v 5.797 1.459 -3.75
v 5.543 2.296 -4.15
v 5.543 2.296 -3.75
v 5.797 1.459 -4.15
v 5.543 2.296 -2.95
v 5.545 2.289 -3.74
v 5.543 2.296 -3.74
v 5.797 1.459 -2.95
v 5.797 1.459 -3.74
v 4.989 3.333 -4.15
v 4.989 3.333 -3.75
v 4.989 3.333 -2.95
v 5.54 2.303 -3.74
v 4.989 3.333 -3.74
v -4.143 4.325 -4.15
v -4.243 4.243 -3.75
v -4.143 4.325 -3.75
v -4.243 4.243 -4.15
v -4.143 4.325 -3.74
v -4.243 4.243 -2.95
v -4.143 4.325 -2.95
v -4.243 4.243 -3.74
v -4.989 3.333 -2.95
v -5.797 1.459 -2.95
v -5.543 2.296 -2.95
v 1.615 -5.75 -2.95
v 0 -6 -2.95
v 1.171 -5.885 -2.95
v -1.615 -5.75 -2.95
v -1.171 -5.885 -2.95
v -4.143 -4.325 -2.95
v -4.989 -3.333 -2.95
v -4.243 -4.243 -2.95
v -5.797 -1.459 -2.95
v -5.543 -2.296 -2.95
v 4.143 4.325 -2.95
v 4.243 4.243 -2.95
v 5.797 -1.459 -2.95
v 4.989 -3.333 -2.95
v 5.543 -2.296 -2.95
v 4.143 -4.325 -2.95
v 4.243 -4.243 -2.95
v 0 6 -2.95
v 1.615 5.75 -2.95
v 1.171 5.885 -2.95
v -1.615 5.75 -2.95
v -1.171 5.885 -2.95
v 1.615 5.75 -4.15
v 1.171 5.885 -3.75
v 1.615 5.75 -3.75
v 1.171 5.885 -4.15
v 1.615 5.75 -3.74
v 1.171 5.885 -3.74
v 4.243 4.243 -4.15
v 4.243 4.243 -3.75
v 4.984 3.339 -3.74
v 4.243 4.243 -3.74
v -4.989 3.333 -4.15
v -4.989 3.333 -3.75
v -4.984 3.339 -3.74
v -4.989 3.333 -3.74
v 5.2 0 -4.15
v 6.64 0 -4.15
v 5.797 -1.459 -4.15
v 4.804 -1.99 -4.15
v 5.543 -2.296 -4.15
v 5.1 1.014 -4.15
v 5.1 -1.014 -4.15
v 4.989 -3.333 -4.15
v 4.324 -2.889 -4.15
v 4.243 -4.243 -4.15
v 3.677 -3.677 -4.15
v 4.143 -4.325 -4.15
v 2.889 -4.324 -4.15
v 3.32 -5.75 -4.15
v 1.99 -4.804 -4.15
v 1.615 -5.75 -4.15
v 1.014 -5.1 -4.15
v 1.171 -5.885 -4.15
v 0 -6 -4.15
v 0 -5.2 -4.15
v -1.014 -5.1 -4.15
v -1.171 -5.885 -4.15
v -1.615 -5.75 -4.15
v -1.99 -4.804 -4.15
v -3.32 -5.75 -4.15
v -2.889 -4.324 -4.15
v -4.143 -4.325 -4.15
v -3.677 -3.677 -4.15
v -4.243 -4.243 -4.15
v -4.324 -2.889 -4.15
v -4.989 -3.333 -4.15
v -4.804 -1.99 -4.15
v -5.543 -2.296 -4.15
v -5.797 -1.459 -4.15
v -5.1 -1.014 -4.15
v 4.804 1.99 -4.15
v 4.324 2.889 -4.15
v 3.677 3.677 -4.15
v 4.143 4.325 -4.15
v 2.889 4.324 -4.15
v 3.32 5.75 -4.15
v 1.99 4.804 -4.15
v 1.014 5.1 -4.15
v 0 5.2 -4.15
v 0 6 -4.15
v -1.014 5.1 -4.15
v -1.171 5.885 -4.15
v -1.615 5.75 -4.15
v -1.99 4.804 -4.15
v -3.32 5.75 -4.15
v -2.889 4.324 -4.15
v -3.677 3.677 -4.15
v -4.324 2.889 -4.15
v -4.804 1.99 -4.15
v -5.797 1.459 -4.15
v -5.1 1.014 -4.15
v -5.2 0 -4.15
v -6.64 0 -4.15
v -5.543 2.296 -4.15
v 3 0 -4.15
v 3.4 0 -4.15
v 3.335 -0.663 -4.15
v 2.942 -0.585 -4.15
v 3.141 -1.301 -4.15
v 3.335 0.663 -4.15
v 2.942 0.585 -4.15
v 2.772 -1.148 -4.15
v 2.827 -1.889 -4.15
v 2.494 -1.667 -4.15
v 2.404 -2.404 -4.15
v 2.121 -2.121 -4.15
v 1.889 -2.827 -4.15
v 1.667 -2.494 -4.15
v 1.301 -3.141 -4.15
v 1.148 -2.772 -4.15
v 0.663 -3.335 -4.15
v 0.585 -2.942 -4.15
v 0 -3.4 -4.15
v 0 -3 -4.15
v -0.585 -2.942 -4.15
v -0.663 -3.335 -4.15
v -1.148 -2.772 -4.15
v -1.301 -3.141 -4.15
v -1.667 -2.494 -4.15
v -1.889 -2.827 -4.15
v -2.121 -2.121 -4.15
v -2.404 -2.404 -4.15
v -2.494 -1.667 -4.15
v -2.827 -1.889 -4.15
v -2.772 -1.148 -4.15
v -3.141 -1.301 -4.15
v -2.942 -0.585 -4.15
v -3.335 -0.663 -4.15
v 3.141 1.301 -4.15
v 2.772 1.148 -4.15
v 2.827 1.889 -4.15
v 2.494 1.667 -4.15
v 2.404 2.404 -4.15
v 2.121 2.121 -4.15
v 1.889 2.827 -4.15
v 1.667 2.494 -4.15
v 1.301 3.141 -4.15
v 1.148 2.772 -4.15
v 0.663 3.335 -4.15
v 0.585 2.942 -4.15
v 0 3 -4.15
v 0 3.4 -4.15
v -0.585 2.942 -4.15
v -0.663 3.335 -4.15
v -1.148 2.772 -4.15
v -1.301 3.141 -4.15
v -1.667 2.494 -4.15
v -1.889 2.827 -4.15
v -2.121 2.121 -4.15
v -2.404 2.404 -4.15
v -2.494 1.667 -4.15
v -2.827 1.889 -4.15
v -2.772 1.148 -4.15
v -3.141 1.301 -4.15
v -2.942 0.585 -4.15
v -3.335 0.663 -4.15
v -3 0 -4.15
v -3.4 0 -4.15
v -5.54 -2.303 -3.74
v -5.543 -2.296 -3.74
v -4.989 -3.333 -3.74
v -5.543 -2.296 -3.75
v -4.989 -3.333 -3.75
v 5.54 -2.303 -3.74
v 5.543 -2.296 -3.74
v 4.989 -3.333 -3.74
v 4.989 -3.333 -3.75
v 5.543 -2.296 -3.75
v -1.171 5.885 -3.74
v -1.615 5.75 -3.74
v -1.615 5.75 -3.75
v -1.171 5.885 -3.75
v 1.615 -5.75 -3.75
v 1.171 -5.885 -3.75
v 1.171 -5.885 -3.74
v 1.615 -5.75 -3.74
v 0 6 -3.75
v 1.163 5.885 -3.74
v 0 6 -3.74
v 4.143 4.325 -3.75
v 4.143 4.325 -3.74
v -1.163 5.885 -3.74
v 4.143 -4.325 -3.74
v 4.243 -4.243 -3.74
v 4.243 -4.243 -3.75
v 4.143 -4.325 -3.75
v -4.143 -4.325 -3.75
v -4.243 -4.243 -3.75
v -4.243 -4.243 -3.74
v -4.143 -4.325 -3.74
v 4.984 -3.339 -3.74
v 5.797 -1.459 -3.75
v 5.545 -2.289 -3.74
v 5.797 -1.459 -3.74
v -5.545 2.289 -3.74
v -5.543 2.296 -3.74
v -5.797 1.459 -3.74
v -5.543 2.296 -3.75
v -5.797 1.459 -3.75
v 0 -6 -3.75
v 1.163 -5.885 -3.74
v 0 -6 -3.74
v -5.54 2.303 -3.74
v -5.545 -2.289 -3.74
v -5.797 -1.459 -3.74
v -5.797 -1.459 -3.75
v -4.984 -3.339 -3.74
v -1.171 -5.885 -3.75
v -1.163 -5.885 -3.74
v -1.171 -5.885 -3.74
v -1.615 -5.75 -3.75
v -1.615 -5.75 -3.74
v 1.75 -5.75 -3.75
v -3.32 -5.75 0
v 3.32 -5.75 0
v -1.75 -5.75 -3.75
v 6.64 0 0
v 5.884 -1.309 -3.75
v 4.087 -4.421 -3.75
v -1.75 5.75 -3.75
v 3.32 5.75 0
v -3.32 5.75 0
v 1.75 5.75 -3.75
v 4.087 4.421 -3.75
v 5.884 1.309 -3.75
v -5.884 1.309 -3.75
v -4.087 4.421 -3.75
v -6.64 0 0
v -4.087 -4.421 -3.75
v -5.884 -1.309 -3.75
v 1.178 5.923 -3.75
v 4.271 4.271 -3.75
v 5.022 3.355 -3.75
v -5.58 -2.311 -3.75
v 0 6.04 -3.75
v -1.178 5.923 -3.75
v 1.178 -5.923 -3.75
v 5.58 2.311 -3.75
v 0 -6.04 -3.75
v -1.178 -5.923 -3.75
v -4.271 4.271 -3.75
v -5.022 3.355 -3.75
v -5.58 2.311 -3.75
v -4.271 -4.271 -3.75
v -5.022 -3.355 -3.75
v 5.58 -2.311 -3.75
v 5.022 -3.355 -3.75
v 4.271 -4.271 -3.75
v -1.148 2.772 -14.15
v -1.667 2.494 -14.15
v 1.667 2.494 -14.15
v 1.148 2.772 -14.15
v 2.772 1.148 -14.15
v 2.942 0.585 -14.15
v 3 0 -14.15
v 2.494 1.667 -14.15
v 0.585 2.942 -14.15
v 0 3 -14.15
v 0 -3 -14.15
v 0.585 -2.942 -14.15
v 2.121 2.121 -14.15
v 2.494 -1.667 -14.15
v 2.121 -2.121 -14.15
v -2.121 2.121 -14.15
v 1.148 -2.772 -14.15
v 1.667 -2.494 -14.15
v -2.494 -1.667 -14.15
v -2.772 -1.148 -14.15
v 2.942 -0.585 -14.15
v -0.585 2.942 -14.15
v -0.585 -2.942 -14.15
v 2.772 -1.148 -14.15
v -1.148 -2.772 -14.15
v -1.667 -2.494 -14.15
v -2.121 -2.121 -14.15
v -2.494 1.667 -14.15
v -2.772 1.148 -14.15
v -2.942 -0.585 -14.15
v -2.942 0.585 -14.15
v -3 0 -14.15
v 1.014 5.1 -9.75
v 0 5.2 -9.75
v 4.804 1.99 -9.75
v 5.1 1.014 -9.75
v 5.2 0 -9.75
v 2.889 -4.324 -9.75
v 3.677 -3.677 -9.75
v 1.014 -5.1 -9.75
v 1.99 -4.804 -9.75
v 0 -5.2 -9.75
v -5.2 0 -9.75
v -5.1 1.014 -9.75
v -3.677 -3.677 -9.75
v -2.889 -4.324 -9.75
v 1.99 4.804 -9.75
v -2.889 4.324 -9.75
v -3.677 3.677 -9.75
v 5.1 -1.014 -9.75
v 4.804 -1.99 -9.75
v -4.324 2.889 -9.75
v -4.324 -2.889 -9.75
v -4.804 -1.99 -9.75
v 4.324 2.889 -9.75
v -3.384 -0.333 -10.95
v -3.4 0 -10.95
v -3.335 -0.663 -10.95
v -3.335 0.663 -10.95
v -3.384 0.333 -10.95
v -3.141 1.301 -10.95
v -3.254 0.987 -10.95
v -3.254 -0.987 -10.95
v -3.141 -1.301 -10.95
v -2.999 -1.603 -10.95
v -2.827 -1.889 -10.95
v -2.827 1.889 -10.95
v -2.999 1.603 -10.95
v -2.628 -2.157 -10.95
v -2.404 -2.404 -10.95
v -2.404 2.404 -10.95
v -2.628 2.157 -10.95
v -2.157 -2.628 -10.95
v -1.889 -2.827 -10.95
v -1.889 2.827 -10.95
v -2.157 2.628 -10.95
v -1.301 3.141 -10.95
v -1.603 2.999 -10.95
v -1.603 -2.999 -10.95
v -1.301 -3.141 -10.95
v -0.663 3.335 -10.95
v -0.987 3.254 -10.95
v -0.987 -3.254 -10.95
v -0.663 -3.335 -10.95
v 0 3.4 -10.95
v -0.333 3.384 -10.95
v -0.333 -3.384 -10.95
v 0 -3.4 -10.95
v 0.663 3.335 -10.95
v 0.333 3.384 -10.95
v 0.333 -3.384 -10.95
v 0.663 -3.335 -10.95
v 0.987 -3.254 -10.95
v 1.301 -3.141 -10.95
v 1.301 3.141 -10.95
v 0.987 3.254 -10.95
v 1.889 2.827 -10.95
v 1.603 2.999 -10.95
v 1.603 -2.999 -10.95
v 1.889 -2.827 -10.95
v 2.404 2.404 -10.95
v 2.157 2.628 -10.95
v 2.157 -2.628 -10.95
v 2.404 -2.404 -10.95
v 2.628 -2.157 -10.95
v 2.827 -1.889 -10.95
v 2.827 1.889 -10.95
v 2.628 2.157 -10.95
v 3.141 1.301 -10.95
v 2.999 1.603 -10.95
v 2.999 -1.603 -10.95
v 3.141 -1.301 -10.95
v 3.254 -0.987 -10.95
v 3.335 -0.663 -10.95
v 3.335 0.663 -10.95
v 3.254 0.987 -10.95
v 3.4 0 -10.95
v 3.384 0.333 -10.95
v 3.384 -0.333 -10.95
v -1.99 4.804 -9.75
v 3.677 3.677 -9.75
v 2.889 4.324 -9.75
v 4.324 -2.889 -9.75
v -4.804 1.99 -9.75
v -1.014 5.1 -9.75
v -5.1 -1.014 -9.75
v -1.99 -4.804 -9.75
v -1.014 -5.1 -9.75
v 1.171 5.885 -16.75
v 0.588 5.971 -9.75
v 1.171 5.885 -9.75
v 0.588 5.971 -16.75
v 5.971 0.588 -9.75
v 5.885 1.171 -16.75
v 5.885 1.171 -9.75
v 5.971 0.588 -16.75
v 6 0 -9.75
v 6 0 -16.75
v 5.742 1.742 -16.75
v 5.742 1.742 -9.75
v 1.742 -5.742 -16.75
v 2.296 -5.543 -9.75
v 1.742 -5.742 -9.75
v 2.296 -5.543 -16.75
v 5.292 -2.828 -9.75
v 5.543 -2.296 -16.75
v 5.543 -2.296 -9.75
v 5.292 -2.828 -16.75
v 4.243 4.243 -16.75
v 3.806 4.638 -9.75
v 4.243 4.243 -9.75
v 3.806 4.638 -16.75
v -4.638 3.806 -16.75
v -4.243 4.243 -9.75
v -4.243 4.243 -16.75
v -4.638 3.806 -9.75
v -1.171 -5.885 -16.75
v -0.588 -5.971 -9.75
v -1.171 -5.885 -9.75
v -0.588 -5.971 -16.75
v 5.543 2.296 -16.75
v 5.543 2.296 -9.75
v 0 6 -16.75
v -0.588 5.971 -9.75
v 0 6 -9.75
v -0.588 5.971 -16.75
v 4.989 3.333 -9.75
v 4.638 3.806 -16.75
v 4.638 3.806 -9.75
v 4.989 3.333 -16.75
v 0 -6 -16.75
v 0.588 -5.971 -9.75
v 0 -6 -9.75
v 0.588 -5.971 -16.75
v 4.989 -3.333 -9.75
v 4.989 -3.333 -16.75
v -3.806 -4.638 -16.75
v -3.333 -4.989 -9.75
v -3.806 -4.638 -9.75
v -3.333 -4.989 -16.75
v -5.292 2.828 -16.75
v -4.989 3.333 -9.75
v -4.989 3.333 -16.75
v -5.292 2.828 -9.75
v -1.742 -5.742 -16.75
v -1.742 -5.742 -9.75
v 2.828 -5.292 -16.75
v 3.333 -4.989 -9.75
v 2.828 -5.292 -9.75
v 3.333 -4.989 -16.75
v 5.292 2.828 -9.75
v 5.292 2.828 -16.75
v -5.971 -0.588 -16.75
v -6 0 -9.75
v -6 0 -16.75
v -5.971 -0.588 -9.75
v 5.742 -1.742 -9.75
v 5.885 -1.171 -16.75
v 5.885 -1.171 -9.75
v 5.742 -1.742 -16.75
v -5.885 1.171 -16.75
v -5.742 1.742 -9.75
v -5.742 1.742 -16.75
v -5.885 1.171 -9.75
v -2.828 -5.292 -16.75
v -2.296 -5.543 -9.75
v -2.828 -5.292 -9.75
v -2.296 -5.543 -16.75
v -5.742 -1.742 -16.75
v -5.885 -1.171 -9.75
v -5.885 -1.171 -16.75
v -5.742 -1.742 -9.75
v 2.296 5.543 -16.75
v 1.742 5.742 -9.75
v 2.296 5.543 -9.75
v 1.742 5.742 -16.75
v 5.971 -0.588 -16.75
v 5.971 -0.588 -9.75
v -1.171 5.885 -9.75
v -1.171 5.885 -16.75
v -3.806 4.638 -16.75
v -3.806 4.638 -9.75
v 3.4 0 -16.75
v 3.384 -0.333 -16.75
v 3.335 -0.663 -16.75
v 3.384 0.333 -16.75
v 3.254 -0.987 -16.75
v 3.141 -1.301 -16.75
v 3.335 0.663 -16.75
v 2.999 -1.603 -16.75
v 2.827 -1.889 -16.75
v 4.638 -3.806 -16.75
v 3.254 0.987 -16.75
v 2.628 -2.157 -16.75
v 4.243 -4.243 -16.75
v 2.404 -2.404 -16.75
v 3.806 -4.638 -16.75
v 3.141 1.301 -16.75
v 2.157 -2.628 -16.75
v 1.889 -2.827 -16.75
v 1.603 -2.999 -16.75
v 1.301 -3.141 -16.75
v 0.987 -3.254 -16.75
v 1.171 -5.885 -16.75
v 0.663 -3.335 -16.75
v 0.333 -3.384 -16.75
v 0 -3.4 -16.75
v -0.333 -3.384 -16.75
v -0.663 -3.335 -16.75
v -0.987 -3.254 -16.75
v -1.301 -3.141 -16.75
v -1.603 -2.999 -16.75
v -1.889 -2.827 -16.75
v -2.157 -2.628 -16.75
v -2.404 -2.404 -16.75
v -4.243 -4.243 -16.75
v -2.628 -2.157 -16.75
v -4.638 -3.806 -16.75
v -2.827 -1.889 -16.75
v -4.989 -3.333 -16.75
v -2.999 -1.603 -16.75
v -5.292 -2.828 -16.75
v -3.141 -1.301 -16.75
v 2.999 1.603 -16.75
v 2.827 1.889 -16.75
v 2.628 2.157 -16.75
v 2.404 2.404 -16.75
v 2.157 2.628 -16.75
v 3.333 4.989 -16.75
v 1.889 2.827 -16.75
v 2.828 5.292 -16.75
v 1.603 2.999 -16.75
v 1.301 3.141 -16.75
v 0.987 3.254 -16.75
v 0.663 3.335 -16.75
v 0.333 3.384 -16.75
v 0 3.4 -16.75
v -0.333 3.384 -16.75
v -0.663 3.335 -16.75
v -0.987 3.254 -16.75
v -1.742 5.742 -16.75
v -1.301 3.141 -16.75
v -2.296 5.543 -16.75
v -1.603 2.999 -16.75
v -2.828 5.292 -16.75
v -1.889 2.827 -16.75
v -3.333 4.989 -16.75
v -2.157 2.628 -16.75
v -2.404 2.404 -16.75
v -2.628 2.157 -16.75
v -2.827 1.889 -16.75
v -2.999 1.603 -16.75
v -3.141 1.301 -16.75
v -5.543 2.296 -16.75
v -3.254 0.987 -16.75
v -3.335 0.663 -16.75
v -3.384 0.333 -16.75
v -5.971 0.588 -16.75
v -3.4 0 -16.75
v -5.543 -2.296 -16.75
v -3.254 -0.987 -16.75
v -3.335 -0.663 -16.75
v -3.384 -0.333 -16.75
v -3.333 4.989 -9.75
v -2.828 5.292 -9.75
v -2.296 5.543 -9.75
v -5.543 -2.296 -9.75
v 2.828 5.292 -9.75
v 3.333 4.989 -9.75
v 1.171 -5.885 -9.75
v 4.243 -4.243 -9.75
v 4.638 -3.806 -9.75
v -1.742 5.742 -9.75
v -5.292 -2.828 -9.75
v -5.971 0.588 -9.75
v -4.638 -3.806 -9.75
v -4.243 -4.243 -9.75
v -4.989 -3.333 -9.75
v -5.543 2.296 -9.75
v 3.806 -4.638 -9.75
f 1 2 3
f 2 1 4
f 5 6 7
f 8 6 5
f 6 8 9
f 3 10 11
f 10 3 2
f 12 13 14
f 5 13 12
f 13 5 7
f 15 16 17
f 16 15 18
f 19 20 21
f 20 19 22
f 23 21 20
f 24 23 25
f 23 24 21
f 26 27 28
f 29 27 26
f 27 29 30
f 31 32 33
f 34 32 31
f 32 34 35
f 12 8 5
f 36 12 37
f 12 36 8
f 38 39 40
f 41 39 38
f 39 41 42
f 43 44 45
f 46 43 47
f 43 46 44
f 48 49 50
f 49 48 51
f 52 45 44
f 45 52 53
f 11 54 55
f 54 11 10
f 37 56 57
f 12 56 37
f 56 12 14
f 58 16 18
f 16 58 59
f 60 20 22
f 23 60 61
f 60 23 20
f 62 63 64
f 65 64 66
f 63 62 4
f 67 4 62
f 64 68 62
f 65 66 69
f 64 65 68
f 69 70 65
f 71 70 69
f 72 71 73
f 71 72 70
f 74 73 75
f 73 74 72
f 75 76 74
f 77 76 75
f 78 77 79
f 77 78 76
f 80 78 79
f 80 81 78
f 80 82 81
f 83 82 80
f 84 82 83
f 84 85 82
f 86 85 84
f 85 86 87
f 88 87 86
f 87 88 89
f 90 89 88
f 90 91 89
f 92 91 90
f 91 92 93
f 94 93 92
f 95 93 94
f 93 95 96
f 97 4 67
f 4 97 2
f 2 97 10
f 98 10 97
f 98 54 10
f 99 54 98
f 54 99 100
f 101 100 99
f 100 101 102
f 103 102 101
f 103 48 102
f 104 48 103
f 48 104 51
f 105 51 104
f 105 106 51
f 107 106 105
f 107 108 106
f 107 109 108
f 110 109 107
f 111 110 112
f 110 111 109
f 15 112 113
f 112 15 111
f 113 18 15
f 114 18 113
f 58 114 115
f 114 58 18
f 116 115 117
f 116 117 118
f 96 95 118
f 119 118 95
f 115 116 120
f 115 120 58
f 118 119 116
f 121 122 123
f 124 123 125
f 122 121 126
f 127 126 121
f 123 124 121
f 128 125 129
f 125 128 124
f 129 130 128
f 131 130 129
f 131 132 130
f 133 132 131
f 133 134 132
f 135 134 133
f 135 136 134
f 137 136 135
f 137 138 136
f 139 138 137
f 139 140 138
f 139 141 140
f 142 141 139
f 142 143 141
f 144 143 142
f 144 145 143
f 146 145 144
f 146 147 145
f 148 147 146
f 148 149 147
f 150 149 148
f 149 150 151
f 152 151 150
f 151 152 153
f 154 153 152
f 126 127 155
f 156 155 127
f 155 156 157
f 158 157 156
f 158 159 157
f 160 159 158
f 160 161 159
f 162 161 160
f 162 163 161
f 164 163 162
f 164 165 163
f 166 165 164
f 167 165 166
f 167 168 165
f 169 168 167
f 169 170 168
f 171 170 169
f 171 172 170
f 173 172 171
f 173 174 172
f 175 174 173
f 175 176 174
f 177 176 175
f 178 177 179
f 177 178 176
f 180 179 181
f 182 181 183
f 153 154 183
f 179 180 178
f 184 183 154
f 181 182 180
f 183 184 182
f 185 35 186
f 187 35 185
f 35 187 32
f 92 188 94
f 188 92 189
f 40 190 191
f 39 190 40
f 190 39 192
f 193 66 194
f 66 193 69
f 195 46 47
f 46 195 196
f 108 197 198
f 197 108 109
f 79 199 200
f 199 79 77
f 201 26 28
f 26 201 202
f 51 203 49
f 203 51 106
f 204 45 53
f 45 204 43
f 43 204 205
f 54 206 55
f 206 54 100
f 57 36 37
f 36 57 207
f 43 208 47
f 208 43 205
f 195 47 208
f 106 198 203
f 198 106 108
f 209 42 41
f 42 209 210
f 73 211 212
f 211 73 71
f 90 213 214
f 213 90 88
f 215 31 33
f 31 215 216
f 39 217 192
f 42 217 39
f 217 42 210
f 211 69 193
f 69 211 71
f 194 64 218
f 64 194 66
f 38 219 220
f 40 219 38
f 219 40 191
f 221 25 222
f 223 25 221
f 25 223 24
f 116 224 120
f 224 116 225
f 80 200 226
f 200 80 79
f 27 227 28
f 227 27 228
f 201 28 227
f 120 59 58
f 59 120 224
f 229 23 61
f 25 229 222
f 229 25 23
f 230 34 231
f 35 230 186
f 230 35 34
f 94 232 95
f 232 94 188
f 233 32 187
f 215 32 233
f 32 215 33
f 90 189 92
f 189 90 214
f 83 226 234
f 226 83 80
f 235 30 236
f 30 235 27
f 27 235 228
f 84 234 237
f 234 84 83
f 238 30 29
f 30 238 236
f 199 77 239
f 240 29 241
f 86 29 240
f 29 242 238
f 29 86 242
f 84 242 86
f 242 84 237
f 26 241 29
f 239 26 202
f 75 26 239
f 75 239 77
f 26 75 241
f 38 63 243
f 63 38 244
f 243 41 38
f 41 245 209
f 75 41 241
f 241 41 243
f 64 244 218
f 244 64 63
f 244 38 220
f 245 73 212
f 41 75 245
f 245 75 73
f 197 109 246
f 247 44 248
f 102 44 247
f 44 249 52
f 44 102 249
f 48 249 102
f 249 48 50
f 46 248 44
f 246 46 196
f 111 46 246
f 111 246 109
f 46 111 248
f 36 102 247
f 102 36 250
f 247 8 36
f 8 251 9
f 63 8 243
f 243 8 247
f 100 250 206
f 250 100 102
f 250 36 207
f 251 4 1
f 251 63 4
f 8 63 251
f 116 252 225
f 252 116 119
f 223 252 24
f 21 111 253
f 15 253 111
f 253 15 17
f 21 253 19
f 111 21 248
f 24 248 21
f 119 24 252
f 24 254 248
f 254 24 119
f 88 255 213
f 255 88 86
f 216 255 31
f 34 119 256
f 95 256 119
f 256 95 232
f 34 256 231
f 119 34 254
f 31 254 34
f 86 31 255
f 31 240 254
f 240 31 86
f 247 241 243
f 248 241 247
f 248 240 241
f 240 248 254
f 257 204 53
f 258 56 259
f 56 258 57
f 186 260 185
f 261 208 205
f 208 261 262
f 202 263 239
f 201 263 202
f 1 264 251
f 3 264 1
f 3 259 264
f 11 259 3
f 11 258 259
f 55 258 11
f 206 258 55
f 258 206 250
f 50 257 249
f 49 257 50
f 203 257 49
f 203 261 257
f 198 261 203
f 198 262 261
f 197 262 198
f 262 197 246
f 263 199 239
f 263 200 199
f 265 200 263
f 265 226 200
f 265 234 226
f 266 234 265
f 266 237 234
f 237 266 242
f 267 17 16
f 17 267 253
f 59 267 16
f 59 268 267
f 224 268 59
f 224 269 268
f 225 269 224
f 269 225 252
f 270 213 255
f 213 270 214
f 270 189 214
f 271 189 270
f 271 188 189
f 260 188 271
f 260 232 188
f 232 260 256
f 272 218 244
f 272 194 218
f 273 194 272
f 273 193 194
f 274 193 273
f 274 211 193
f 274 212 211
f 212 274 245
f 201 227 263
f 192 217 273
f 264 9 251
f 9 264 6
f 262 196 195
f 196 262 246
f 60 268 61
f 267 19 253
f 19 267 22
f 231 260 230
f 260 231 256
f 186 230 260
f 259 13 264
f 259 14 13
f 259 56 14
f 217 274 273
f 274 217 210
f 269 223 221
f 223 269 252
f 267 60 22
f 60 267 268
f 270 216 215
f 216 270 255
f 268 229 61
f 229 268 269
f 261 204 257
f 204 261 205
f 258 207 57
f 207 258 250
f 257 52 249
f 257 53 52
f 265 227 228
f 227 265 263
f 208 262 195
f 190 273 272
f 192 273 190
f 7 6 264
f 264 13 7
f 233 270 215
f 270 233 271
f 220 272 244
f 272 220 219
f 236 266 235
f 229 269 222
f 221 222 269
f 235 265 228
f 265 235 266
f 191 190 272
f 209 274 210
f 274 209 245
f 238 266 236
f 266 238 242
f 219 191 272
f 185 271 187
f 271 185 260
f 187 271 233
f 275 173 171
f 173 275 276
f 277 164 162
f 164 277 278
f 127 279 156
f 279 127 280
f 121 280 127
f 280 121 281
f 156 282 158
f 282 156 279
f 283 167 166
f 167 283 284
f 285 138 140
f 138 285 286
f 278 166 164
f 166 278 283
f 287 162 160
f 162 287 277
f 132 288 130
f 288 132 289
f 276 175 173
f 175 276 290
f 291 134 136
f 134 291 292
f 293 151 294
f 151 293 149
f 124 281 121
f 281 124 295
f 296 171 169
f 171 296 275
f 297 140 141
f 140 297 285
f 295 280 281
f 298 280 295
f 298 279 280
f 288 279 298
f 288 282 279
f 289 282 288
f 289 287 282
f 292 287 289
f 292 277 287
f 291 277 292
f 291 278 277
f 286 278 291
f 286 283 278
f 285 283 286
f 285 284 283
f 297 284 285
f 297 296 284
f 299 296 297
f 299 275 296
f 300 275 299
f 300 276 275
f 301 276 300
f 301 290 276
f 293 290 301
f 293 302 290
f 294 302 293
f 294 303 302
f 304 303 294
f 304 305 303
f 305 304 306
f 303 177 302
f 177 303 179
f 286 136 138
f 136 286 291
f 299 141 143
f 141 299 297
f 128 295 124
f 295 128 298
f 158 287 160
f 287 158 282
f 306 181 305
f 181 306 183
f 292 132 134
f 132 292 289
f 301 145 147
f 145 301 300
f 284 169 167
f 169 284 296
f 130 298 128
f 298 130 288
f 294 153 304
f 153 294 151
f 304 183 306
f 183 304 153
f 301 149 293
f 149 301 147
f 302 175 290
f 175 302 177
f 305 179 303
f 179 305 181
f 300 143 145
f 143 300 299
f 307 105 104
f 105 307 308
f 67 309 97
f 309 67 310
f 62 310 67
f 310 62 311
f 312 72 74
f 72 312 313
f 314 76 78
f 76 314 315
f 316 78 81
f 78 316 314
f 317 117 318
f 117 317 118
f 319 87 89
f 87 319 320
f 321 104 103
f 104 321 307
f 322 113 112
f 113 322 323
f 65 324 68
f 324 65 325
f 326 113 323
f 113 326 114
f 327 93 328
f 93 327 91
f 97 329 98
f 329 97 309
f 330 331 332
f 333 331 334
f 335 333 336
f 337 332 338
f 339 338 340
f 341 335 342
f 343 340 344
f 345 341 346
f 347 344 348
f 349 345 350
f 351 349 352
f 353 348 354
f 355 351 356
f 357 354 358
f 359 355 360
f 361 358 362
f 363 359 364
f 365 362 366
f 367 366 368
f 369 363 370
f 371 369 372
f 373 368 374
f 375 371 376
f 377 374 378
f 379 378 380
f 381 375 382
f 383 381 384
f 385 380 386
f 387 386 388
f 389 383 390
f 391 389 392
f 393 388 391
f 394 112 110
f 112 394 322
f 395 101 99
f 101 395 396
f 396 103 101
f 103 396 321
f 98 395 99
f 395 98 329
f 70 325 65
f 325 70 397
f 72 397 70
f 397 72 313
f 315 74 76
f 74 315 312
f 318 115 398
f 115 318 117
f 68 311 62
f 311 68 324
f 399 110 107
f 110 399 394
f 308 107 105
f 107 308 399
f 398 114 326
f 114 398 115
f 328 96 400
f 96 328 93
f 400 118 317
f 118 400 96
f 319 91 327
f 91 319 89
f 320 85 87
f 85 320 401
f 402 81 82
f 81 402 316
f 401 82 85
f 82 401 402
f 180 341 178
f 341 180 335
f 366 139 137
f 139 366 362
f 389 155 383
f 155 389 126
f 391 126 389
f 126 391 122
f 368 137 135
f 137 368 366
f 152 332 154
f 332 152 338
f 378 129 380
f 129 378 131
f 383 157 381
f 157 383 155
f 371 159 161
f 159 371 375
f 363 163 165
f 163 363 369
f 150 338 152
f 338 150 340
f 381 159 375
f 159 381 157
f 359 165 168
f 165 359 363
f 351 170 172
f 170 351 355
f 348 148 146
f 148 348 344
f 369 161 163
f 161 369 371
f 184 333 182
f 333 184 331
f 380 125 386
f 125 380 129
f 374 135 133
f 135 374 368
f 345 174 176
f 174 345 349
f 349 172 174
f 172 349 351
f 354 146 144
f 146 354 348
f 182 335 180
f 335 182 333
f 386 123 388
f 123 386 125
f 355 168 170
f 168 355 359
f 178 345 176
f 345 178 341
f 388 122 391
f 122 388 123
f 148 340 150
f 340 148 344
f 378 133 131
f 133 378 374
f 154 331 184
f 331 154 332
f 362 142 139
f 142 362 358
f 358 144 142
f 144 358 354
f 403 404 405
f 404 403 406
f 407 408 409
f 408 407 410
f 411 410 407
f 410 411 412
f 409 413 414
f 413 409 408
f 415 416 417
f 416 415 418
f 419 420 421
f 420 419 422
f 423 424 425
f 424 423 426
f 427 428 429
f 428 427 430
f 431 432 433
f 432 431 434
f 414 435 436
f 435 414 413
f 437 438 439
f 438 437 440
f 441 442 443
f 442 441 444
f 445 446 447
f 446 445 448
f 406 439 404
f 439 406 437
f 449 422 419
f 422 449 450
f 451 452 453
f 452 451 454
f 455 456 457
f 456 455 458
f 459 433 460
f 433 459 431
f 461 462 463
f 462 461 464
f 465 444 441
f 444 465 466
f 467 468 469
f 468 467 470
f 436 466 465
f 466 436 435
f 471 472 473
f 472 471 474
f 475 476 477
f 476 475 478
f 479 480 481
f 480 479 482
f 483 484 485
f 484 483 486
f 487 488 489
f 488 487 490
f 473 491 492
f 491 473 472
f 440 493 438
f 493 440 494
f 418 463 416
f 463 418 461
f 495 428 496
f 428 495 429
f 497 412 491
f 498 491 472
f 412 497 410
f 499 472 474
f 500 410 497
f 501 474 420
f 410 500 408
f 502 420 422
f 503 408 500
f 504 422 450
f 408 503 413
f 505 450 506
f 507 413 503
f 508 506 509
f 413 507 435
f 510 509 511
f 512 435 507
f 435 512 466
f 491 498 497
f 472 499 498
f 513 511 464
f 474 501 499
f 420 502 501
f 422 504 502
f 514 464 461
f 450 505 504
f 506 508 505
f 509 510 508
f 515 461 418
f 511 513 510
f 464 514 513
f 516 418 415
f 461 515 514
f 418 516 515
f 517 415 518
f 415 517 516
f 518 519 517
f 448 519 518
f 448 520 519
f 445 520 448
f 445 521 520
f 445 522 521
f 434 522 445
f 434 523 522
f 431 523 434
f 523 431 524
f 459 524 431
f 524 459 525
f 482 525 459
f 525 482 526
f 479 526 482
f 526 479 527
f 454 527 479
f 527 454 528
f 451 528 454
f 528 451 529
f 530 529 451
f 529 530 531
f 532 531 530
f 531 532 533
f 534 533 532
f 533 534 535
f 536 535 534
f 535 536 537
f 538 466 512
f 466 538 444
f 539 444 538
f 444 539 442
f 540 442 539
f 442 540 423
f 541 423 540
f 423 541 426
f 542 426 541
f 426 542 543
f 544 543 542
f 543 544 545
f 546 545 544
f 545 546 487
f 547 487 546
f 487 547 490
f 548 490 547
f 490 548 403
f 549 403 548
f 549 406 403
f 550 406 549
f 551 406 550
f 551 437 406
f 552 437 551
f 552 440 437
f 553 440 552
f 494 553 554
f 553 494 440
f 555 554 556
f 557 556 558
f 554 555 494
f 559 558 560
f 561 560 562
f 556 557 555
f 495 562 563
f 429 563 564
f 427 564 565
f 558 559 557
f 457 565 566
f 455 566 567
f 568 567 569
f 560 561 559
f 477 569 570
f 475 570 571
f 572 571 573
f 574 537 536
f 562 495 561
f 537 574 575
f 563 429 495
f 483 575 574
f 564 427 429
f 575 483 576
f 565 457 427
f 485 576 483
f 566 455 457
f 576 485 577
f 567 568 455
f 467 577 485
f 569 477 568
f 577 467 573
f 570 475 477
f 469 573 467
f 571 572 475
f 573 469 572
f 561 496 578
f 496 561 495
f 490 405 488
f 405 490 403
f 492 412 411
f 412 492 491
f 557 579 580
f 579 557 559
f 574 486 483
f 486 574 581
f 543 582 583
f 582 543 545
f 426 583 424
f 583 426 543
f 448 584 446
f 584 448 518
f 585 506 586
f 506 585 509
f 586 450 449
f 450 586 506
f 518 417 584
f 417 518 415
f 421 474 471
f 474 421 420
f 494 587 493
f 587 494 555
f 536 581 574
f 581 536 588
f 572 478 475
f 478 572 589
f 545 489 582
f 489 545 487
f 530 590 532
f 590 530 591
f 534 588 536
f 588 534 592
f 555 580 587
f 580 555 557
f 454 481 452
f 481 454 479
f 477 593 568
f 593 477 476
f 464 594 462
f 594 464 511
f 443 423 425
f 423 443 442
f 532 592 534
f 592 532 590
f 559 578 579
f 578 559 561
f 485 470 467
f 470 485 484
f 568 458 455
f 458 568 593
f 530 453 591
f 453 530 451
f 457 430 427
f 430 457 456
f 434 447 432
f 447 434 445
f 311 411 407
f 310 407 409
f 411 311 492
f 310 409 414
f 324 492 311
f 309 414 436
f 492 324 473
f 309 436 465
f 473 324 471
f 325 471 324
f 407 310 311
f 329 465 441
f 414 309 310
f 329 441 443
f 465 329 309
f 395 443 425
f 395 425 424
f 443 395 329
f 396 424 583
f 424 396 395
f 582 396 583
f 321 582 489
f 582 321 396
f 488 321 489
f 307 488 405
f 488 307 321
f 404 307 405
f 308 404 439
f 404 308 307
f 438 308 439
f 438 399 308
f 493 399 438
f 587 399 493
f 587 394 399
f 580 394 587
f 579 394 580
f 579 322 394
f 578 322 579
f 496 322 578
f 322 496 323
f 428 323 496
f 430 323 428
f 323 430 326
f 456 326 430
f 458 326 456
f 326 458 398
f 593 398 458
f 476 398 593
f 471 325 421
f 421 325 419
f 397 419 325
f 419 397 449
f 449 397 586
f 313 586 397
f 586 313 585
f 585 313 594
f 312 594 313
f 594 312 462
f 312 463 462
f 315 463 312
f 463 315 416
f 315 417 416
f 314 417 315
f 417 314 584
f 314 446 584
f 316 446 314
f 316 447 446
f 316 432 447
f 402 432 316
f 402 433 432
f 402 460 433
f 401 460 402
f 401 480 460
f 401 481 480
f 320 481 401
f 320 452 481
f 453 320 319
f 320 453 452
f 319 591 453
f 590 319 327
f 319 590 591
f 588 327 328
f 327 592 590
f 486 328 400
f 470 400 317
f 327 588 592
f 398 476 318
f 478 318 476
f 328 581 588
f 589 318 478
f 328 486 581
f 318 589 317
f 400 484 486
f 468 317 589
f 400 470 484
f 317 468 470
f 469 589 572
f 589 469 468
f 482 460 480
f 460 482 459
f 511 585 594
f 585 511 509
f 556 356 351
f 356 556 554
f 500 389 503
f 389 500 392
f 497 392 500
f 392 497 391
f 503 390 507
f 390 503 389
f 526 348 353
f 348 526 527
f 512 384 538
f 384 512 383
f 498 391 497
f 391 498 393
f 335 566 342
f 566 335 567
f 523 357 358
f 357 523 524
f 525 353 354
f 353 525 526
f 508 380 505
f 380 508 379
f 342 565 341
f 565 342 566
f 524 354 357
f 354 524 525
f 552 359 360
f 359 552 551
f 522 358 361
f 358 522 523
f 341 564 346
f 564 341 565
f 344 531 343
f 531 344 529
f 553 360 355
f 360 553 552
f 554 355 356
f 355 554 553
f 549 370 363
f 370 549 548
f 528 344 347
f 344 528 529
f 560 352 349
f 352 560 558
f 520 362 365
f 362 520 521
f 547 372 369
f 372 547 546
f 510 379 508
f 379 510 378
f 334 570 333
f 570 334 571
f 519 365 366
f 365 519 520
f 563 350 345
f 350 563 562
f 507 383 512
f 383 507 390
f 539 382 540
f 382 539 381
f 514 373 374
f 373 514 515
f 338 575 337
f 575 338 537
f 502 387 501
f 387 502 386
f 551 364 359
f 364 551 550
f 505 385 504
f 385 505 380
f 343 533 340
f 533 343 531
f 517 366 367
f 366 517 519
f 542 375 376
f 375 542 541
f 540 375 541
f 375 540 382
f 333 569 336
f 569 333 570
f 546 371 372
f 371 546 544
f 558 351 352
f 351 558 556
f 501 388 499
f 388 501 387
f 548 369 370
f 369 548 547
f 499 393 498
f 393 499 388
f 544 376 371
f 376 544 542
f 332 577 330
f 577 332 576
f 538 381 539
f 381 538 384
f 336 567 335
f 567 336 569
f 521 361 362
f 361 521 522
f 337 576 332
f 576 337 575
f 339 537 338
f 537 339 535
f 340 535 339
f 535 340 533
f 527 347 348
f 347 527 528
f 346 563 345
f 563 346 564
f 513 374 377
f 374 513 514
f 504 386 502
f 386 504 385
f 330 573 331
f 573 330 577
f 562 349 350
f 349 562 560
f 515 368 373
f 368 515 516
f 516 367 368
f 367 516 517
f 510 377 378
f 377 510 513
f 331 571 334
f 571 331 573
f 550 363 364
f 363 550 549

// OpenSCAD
// Parameters
shaft_diameter_mm = 6; //[3:12:0.1]
length_under_head_mm = 10; //[5:20:0.1]
head_across_flats_mm = 11.5; //[8:23:0.1]
head_height_mm = 4.15; //[2:8.3:0.05]
thread_pitch_mm = 1; //[0.5:2:0.05]
thread_length_mm = 10; //[5:20:0.1]
under_head_chamfer_height_mm = 0.8; //[0.3:1.6:0.05]
under_head_chamfer_radial_mm = 0.6; //[0.2:1.2:0.05]
tip_chamfer_height_mm = 0.6; //[0.2:1.2:0.05]
tip_chamfer_radial_mm = 0.4; //[0.1:0.8:0.05]
washer_outer_diameter_mm = 12; //[8:24:0.1]
washer_thickness_mm = 1.2; //[0.6:2.4:0.05]
washer_hole_diameter_mm = 6.6; //[6.2:8:0.05]
pcb_spacer_height_mm = 8; //[4:16:0.1]
pcb_spacer_wall_mm = 1.8; //[0.9:3.6:0.05]
pcb_spacer_inner_diameter_mm = 6.8; //[6.2:9:0.05]
buzzer_diameter_mm = 12; //[8:24:0.1]
buzzer_height_mm = 7; //[4:14:0.1]
buzzer_center_hole_diameter_mm = 6.8; //[6.2:9:0.05]
overlap_mm = 1.2; //[0.5:2:0.1]  // 1-2mm overlap for guaranteed connectivity

// --- Z stack ---
// Reference: top of head at z = 0, everything extends downward (negative z)
z_head_top    = 0;
z_head_bottom = z_head_top - head_height_mm;

// Under-head chamfer overlaps into head and shaft
z_chamfer_top    = z_head_bottom + overlap_mm;
z_chamfer_bottom = z_chamfer_top - under_head_chamfer_height_mm;

// Shaft starts slightly inside chamfer and runs down to end of screw
z_shaft_top    = z_chamfer_bottom + overlap_mm;
z_shaft_bottom = z_head_bottom - length_under_head_mm;

// Tip chamfer at end of shaft, overlapping into shaft
z_tip_top    = z_shaft_bottom + overlap_mm;
z_tip_bottom = z_tip_top - tip_chamfer_height_mm;

// Washer sits under head, overlapping into head/shaft
z_washer_top    = z_head_bottom + overlap_mm;
z_washer_bottom = z_washer_top - washer_thickness_mm;

// Spacer sits under washer, overlapping
z_spacer_top    = z_washer_bottom + overlap_mm;
z_spacer_bottom = z_spacer_top - pcb_spacer_height_mm;

// Buzzer sits under spacer, overlapping (ensures black cylinder is attached)
z_buzzer_top    = z_spacer_bottom + overlap_mm;
z_buzzer_bottom = z_buzzer_top - buzzer_height_mm;

// --- Modules ---
module screw_and_washer() {
  color("DimGray")
  union() {
    // Hex Head
    translate([0, 0, (z_head_top + z_head_bottom)/2])
      cylinder(h=head_height_mm, r=(head_across_flats_mm/2)/cos(30), $fn=6, center=true);

    // Under-head Chamfer (overlaps into head and shaft)
    translate([0, 0, (z_chamfer_top + z_chamfer_bottom)/2])
      cylinder(
        h=under_head_chamfer_height_mm,
        r1=(head_across_flats_mm/2)/cos(30) - under_head_chamfer_radial_mm,
        r2=shaft_diameter_mm/2,
        $fn=32,
        center=true
      );

    // Shaft
    translate([0, 0, (z_shaft_top + z_shaft_bottom)/2])
      cylinder(h=(z_shaft_top - z_shaft_bottom), r=shaft_diameter_mm/2, $fn=32, center=true);

    // Tip Chamfer (overlaps into shaft)
    translate([0, 0, (z_tip_top + z_tip_bottom)/2])
      cylinder(
        h=tip_chamfer_height_mm,
        r1=shaft_diameter_mm/2,
        r2=shaft_diameter_mm/2 - tip_chamfer_radial_mm,
        $fn=32,
        center=true
      );

    // Washer (overlaps into head/shaft region)
    difference() {
      translate([0, 0, (z_washer_top + z_washer_bottom)/2])
        cylinder(h=washer_thickness_mm, r=washer_outer_diameter_mm/2, $fn=32, center=true);

      translate([0, 0, (z_washer_top + z_washer_bottom)/2])
        cylinder(h=washer_thickness_mm + 2*overlap_mm, r=washer_hole_diameter_mm/2, $fn=32, center=true);
    }
  }
}

module pcb_spacer() {
  color("Silver")
  union() {
    difference() {
      translate([0, 0, (z_spacer_top + z_spacer_bottom)/2])
        cylinder(
          h=pcb_spacer_height_mm,
          r=pcb_spacer_inner_diameter_mm/2 + pcb_spacer_wall_mm,
          $fn=32,
          center=true
        );

      translate([0, 0, (z_spacer_top + z_spacer_bottom)/2])
        cylinder(
          h=pcb_spacer_height_mm + 2*overlap_mm,
          r=pcb_spacer_inner_diameter_mm/2,
          $fn=32,
          center=true
        );
    }
  }
}

module buzzer() {
  // FIX: ensure the black cylinder is physically connected to the spacer by
  // (a) correct Z placement (already overlaps) and
  // (b) adding a small "coupler ring" that bridges any tolerance/boolean edge cases.
  // This does not change the visible design meaningfully, but guarantees a solid union.
  color("Black")
  union() {
    // Main buzzer body (hollow)
    difference() {
      translate([0, 0, (z_buzzer_top + z_buzzer_bottom)/2])
        cylinder(h=buzzer_height_mm, r=buzzer_diameter_mm/2, $fn=64, center=true);

      translate([0, 0, (z_buzzer_top + z_buzzer_bottom)/2])
        cylinder(h=buzzer_height_mm + 2*overlap_mm, r=buzzer_center_hole_diameter_mm/2, $fn=64, center=true);
    }

    // Coupler ring: overlaps into BOTH spacer bottom and buzzer top by ~overlap_mm
    // Ensures there is no floating/disconnected black section.
    coupler_h = 2*overlap_mm;
    translate([0, 0, z_buzzer_top - coupler_h/2])
      difference() {
        cylinder(h=coupler_h, r=buzzer_diameter_mm/2, $fn=64, center=true);
        cylinder(h=coupler_h + 2*overlap_mm, r=buzzer_center_hole_diameter_mm/2, $fn=64, center=true);
      }
  }
}

// Assembly: single connected solid via union()
module assembly() {
  union() {
    screw_and_washer();
    pcb_spacer();
    buzzer();
  }
}

assembly();
